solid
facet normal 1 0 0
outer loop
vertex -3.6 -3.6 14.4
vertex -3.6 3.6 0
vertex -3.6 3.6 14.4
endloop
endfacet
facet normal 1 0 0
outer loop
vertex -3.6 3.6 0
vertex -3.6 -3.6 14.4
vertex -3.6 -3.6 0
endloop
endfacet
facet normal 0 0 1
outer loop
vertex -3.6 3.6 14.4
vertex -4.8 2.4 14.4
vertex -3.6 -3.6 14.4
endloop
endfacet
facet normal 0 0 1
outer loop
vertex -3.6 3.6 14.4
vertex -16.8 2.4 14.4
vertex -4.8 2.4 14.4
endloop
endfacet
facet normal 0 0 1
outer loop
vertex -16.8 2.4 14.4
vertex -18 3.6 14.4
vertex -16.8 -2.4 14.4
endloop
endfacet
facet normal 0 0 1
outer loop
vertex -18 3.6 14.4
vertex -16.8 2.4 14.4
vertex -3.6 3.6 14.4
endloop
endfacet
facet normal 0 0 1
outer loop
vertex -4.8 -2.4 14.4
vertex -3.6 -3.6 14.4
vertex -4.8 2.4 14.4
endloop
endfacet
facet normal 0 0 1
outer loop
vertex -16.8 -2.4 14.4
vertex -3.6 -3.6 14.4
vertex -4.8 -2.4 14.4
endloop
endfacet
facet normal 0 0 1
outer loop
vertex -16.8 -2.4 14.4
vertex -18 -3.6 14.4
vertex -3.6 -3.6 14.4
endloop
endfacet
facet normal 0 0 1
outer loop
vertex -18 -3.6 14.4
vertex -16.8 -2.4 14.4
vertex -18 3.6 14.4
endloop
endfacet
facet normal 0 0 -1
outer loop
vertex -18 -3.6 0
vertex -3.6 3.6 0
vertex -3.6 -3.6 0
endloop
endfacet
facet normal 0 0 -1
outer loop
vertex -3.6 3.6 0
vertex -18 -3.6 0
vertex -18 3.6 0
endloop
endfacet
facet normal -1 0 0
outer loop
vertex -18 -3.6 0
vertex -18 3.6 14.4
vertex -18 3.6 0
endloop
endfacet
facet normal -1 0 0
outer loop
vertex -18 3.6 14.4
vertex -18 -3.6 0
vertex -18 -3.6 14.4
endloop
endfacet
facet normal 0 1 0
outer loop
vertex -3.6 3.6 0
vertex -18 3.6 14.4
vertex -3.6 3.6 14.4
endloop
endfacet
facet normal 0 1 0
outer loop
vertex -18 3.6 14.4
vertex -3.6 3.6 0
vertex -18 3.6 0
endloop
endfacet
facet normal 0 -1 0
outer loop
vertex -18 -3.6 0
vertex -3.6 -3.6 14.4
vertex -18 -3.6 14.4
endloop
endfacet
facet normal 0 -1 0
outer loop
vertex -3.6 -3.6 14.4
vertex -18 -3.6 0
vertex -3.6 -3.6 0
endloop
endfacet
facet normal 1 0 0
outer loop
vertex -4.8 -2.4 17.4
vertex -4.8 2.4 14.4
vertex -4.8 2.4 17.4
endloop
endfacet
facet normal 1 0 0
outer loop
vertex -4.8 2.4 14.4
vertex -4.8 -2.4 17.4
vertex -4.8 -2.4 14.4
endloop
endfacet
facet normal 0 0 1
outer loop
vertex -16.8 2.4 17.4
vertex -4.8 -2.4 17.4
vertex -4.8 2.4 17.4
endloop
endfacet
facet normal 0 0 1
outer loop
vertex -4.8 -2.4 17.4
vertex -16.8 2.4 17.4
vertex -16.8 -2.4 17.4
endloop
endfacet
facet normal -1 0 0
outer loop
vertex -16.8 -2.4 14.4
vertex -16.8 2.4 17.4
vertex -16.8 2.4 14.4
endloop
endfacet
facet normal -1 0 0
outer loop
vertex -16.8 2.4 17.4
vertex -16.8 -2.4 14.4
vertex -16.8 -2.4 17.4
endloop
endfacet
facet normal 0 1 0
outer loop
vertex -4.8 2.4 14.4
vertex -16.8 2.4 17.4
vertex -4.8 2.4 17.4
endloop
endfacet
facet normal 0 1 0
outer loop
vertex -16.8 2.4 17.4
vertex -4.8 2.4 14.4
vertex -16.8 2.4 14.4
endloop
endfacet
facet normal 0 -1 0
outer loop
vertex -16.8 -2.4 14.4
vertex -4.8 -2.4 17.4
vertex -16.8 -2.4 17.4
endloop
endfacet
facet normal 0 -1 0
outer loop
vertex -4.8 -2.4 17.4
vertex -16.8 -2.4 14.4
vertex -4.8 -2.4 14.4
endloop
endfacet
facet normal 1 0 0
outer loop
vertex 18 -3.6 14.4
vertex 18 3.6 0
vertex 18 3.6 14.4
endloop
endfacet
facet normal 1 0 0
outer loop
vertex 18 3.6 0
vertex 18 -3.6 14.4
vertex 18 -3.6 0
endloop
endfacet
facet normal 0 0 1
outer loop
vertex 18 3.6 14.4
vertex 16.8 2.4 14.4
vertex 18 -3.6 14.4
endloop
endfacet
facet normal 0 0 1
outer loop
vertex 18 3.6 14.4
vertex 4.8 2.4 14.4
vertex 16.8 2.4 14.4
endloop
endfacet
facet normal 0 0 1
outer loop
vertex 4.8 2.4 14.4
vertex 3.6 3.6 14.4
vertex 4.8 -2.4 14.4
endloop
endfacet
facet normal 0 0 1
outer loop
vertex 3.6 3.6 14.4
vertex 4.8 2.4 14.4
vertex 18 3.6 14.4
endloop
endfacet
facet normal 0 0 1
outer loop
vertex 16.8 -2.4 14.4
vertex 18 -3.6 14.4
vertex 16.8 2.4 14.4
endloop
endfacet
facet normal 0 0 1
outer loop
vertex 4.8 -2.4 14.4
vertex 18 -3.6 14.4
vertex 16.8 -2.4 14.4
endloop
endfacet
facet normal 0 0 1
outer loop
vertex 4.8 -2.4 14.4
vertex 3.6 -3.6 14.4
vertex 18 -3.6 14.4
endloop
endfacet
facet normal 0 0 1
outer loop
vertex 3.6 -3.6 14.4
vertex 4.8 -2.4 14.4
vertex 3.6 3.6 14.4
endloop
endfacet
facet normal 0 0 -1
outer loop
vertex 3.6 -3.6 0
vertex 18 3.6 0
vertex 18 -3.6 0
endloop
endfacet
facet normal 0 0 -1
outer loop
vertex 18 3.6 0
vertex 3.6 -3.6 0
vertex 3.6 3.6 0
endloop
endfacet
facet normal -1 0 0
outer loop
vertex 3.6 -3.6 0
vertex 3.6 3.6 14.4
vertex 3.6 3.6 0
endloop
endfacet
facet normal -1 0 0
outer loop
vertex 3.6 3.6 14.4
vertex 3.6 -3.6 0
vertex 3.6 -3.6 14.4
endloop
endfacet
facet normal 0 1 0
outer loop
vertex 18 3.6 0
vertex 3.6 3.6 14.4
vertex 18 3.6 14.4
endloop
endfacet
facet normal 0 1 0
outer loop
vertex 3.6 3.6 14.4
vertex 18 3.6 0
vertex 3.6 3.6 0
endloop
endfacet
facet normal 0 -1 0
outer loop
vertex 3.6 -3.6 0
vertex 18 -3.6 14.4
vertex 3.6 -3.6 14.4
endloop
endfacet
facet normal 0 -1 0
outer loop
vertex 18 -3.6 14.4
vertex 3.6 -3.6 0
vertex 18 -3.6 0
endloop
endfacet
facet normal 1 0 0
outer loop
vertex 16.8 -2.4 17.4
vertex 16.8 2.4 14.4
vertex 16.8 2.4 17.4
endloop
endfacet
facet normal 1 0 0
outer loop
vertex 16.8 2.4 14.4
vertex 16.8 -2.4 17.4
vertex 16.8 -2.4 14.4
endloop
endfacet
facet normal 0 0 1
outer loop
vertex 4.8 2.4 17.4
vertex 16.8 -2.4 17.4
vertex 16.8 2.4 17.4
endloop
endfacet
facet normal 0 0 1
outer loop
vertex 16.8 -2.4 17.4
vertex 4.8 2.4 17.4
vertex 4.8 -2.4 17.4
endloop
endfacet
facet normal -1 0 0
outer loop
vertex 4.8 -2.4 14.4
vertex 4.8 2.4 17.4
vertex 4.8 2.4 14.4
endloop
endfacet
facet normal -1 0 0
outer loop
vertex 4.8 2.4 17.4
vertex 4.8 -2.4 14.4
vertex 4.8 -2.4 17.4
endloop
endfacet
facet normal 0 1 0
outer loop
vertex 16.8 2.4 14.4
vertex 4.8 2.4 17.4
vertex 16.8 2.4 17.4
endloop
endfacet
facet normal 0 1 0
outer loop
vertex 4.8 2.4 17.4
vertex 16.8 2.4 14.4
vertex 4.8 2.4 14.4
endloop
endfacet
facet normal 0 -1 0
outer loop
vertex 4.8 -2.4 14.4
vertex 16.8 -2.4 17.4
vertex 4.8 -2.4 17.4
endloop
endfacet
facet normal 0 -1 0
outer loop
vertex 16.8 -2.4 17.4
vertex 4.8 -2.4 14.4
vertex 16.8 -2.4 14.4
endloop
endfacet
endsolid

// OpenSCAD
// =========================================================================
// CLAW-D MASCOT: LARGE EDITION (SLED READY, REAR SCREW MOUNTS)
// =========================================================================

/* [Fixed Hardware Specifications] */
pcb_w = 27.3;         // Physical width of standard 0.96" PCB
glass_t = 2.4;        // Front of glass to back of PCB
clearance = 0.4;      // 3D printing tolerance fit
$fn = 24;             // Curve smoothness

/* [Adjustable Features] */
print_mode = "arms";  // [ "assembled", "base", "cap", "legs", "arms" ]
eye_w = 25;           // Width of the front eye cutouts - original: 23
eye_h = 12;           // Height of the front eye cutouts - original: 14
eye_mm_height_adjust = 5;
eye_chamfer = 2.0;    // How much the outer edges slant outward for better viewing angle
top_softness = 1.0;   // How much the outer top edge is chamfered (leaves the rest flat for supports)

usb_hole_height_adjuster = 5.0;

// Variables to protect the internal cavity while adding pin holes
bottom_thickness_added = 2.4; 
pin_height = 3.0;
hole_depth = 3.6; 

clawd_chassis();

module clawd_chassis() {
    
    // 1. HARDCODED LARGE PARAMETERS
    unit = 7.2;
    head_w = 86.4;    // 12 * 7.2
    head_h = 69.12;   // 86.4 / 1.25
    head_d = 39.6;    // 5.5 * 7.2

    if (print_mode == "base" || print_mode == "cap" || print_mode == "assembled") {
        difference() {
            // 2. THE ACCURATE PROPORTIONAL OUTER SHELL
            union() {
                // Main Head (Bottom extended downward by bottom_thickness_added)
                translate([-head_w/2, -head_d/2, 2*unit - bottom_thickness_added]) 
                    cube([head_w, head_d, head_h + bottom_thickness_added]);
                
                if (print_mode == "assembled") {
                    // Left Side Stub/Arm
                    translate([-head_w/2 - 2*unit, -unit/2, head_h/2 + unit]) 
                        cube([2*unit, unit, 2*unit]);
                    
                    // Right Side Stub/Arm
                    translate([head_w/2, -unit/2, head_h/2 + unit]) 
                        cube([2*unit, unit, 2*unit]);
                        
                    // ---- STABLE EIGHT LEG SQUID STRUCTURE ----
                    for(x = [-4.5*unit, -2.5*unit, 1.5*unit, 3.5*unit]) {
                        for(y = [-head_d/2, head_d/2 - unit]) {
                            // Legs end where the newly lowered chassis begins
                            translate([x, y, 0]) cube([unit, unit, 2*unit - bottom_thickness_added]);
                        }
                    }
                }
            }
            
            // 3. INTERNAL CAVITY (Untouched coordinates)
            translate([-4.5*unit, -head_d/2 + 2.5, 2*unit + 2])
                cube([9*unit, head_d - 5, head_h - 3.8]);
                
            // 4. FRONT FACE EYE WINDOWS (Two-Stage Cut for Supports + Soft Edge)
            translate([-2.5*unit - eye_w/2.75, -head_d/2 - 0.1, head_h - 2.25*unit - eye_h/2 + eye_mm_height_adjust])
                chamfered_eye(is_left = true);
                
            translate([2.5*unit - eye_w/1.5, -head_d/2 - 0.1, head_h - 2.25*unit - eye_h/2 + eye_mm_height_adjust])
                chamfered_eye(is_left = false);
                
            // 5. PRECISION SCREEN RETENTION SLOT (Untouched coordinates)
            translate([-4.5*unit, -head_d/2 + 2.5, 2*unit + 2])
                cube([9*unit, glass_t + clearance, head_h - 3.8]);

            // 6. UPPER WIRING & PIN RELIEF CHANNEL (Untouched coordinates)
            translate([-4.5*unit, -head_d/2 + 2.5, head_h + unit - 2])
                cube([9*unit, head_d - 5, 3]);
                
            // 7. DIRECT REAR USB-C CABLE PASS-THROUGH (Untouched coordinates)
            translate([-8, head_d/2 - 4, 2*unit + usb_hole_height_adjuster])
                cube([16, 10, 10]);

            // 8. LEG ALIGNMENT HOLES
            if (print_mode == "base") {
                for(x = [-4.5*unit, -2.5*unit, 1.5*unit, 3.5*unit]) {
                    for(y = [-head_d/2, head_d/2 - unit]) {
                        // Cut upwards from the newly lowered chassis bottom
                        translate([x + 1.2 - clearance/2, y + 1.2 - clearance/2, 2*unit - bottom_thickness_added - 0.1])
                            cube([unit - 2.4 + clearance, unit - 2.4 + clearance, hole_depth + 0.1]);
                    }
                }
            }
            
            // 8.5 ARM ALIGNMENT HOLES
            if (print_mode == "base") {
                // Left Arm Hole
                translate([-head_w/2 - 0.1, -unit/2 + 1.2 - clearance/2, head_h/2 + unit + 1.2 - clearance/2])
                    cube([hole_depth + 0.1, unit - 2.4 + clearance, 2*unit - 2.4 + clearance]);
                    
                // Right Arm Hole
                translate([head_w/2 - hole_depth, -unit/2 + 1.2 - clearance/2, head_h/2 + unit + 1.2 - clearance/2])
                    cube([hole_depth + 0.1, unit - 2.4 + clearance, 2*unit - 2.4 + clearance]);
            }
                
            // 9. TUPPERWARE SPLIT CUTTERS
            if (print_mode == "base") {
                difference() {
                    translate([-head_w/2 - 5, -head_d/2 - 5, 2*unit + head_h - 4]) 
                        cube([head_w + 10, head_d + 10, 20]);
                    translate([-head_w/2 + 2, -head_d/2 + 2, 2*unit + head_h - 4]) 
                        cube([head_w - 4, head_d - 4, 2]);
                }
            }
            
            if (print_mode == "cap") {
                translate([-100, -100, -20]) 
                    cube([200, 200, 2*unit + head_h - 4 + 20]);
                    
                translate([-head_w/2 + 1.8, -head_d/2 + 1.8, 2*unit + head_h - 4 - 0.1]) 
                    cube([head_w - 3.6, head_d - 3.6, 2.2]);
            }
        }
    }

    // 10. INDEPENDENT LEGS MODE
    if (print_mode == "legs") {
        for(x = [-4.5*unit, -2.5*unit, 1.5*unit, 3.5*unit]) {
            for(y = [-head_d/2, head_d/2 - unit]) {
                union() {
                    // Leg base (exactly meets the lowered bottom of the chassis)
                    translate([x, y, 0]) 
                        cube([unit, unit, 2*unit - bottom_thickness_added]);
                    // Alignment pin
                    translate([x + 1.2, y + 1.2, 2*unit - bottom_thickness_added]) 
                        cube([unit - 2.4, unit - 2.4, pin_height]);
                }
            }
        }
    }
    
    // 11. INDEPENDENT ARMS MODE (Laid flat for vertical pin printing)
    if (print_mode == "arms") {
        // Generates two identical arms side-by-side on the Z=0 plane
        for(x = [-1.5*unit, 1.5*unit]) {
            translate([x - unit, -unit/2, 0]) {
                union() {
                    // Arm body (laying on its flat side)
                    cube([2*unit, unit, 2*unit]);
                    // Alignment pin (pointing straight up)
                    translate([1.2, 1.2, 2*unit]) 
                        cube([2*unit - 2.4, unit - 2.4, pin_height]);
                }
            }
        }
    }
}

// Module to create a slanted eye-hole cut with a flat roof for supports, ending in a soft outer chamfer
module chamfered_eye(is_left) {
    depth = 3.2; // Penetrates the 2.5mm front wall completely
    
    // Calculates the intermediate side/bottom flare to keep those slopes perfectly straight
    flare_mid = eye_chamfer * ((depth - top_softness) / depth);
    
    union() {
        // STAGE 1: MAIN BODY (Flat Top for Supports) 
        // Extends from the inside out to exactly 'top_softness' distance from the surface
        hull() {
            // INNER HOLE: Matches OLED screen exactly (touching the glass)
            translate([0, depth - 0.1, 0])
                cube([eye_w, 0.1, eye_h]);
                
            // MID HOLE: Transition point where the flat top ends
            if (is_left) {
                translate([-flare_mid, top_softness, -flare_mid])
                    cube([eye_w + flare_mid, 0.1, eye_h + flare_mid]);
            } else {
                translate([0, top_softness, -flare_mid])
                    cube([eye_w + flare_mid, 0.1, eye_h + flare_mid]);
            }
        }
        
        // STAGE 2: OUTER LIP (Softened/Chamfered Top) 
        // Covers the final distance to the outside face, ramping the roof up to break the sharp edge
        hull() {
            // MID HOLE: Transition point
            if (is_left) {
                translate([-flare_mid, top_softness, -flare_mid])
                    cube([eye_w + flare_mid, 0.1, eye_h + flare_mid]);
            } else {
                translate([0, top_softness, -flare_mid])
                    cube([eye_w + flare_mid, 0.1, eye_h + flare_mid]);
            }
            
            // OUTER HOLE: Flared sides/bottom AND flared top
            if (is_left) {
                translate([-eye_chamfer, 0, -eye_chamfer])
                    cube([eye_w + eye_chamfer, 0.1, eye_h + eye_chamfer + top_softness]);
            } else {
                translate([0, 0, -eye_chamfer])
                    cube([eye_w + eye_chamfer, 0.1, eye_h + eye_chamfer + top_softness]);
            }
        }
    }
}
